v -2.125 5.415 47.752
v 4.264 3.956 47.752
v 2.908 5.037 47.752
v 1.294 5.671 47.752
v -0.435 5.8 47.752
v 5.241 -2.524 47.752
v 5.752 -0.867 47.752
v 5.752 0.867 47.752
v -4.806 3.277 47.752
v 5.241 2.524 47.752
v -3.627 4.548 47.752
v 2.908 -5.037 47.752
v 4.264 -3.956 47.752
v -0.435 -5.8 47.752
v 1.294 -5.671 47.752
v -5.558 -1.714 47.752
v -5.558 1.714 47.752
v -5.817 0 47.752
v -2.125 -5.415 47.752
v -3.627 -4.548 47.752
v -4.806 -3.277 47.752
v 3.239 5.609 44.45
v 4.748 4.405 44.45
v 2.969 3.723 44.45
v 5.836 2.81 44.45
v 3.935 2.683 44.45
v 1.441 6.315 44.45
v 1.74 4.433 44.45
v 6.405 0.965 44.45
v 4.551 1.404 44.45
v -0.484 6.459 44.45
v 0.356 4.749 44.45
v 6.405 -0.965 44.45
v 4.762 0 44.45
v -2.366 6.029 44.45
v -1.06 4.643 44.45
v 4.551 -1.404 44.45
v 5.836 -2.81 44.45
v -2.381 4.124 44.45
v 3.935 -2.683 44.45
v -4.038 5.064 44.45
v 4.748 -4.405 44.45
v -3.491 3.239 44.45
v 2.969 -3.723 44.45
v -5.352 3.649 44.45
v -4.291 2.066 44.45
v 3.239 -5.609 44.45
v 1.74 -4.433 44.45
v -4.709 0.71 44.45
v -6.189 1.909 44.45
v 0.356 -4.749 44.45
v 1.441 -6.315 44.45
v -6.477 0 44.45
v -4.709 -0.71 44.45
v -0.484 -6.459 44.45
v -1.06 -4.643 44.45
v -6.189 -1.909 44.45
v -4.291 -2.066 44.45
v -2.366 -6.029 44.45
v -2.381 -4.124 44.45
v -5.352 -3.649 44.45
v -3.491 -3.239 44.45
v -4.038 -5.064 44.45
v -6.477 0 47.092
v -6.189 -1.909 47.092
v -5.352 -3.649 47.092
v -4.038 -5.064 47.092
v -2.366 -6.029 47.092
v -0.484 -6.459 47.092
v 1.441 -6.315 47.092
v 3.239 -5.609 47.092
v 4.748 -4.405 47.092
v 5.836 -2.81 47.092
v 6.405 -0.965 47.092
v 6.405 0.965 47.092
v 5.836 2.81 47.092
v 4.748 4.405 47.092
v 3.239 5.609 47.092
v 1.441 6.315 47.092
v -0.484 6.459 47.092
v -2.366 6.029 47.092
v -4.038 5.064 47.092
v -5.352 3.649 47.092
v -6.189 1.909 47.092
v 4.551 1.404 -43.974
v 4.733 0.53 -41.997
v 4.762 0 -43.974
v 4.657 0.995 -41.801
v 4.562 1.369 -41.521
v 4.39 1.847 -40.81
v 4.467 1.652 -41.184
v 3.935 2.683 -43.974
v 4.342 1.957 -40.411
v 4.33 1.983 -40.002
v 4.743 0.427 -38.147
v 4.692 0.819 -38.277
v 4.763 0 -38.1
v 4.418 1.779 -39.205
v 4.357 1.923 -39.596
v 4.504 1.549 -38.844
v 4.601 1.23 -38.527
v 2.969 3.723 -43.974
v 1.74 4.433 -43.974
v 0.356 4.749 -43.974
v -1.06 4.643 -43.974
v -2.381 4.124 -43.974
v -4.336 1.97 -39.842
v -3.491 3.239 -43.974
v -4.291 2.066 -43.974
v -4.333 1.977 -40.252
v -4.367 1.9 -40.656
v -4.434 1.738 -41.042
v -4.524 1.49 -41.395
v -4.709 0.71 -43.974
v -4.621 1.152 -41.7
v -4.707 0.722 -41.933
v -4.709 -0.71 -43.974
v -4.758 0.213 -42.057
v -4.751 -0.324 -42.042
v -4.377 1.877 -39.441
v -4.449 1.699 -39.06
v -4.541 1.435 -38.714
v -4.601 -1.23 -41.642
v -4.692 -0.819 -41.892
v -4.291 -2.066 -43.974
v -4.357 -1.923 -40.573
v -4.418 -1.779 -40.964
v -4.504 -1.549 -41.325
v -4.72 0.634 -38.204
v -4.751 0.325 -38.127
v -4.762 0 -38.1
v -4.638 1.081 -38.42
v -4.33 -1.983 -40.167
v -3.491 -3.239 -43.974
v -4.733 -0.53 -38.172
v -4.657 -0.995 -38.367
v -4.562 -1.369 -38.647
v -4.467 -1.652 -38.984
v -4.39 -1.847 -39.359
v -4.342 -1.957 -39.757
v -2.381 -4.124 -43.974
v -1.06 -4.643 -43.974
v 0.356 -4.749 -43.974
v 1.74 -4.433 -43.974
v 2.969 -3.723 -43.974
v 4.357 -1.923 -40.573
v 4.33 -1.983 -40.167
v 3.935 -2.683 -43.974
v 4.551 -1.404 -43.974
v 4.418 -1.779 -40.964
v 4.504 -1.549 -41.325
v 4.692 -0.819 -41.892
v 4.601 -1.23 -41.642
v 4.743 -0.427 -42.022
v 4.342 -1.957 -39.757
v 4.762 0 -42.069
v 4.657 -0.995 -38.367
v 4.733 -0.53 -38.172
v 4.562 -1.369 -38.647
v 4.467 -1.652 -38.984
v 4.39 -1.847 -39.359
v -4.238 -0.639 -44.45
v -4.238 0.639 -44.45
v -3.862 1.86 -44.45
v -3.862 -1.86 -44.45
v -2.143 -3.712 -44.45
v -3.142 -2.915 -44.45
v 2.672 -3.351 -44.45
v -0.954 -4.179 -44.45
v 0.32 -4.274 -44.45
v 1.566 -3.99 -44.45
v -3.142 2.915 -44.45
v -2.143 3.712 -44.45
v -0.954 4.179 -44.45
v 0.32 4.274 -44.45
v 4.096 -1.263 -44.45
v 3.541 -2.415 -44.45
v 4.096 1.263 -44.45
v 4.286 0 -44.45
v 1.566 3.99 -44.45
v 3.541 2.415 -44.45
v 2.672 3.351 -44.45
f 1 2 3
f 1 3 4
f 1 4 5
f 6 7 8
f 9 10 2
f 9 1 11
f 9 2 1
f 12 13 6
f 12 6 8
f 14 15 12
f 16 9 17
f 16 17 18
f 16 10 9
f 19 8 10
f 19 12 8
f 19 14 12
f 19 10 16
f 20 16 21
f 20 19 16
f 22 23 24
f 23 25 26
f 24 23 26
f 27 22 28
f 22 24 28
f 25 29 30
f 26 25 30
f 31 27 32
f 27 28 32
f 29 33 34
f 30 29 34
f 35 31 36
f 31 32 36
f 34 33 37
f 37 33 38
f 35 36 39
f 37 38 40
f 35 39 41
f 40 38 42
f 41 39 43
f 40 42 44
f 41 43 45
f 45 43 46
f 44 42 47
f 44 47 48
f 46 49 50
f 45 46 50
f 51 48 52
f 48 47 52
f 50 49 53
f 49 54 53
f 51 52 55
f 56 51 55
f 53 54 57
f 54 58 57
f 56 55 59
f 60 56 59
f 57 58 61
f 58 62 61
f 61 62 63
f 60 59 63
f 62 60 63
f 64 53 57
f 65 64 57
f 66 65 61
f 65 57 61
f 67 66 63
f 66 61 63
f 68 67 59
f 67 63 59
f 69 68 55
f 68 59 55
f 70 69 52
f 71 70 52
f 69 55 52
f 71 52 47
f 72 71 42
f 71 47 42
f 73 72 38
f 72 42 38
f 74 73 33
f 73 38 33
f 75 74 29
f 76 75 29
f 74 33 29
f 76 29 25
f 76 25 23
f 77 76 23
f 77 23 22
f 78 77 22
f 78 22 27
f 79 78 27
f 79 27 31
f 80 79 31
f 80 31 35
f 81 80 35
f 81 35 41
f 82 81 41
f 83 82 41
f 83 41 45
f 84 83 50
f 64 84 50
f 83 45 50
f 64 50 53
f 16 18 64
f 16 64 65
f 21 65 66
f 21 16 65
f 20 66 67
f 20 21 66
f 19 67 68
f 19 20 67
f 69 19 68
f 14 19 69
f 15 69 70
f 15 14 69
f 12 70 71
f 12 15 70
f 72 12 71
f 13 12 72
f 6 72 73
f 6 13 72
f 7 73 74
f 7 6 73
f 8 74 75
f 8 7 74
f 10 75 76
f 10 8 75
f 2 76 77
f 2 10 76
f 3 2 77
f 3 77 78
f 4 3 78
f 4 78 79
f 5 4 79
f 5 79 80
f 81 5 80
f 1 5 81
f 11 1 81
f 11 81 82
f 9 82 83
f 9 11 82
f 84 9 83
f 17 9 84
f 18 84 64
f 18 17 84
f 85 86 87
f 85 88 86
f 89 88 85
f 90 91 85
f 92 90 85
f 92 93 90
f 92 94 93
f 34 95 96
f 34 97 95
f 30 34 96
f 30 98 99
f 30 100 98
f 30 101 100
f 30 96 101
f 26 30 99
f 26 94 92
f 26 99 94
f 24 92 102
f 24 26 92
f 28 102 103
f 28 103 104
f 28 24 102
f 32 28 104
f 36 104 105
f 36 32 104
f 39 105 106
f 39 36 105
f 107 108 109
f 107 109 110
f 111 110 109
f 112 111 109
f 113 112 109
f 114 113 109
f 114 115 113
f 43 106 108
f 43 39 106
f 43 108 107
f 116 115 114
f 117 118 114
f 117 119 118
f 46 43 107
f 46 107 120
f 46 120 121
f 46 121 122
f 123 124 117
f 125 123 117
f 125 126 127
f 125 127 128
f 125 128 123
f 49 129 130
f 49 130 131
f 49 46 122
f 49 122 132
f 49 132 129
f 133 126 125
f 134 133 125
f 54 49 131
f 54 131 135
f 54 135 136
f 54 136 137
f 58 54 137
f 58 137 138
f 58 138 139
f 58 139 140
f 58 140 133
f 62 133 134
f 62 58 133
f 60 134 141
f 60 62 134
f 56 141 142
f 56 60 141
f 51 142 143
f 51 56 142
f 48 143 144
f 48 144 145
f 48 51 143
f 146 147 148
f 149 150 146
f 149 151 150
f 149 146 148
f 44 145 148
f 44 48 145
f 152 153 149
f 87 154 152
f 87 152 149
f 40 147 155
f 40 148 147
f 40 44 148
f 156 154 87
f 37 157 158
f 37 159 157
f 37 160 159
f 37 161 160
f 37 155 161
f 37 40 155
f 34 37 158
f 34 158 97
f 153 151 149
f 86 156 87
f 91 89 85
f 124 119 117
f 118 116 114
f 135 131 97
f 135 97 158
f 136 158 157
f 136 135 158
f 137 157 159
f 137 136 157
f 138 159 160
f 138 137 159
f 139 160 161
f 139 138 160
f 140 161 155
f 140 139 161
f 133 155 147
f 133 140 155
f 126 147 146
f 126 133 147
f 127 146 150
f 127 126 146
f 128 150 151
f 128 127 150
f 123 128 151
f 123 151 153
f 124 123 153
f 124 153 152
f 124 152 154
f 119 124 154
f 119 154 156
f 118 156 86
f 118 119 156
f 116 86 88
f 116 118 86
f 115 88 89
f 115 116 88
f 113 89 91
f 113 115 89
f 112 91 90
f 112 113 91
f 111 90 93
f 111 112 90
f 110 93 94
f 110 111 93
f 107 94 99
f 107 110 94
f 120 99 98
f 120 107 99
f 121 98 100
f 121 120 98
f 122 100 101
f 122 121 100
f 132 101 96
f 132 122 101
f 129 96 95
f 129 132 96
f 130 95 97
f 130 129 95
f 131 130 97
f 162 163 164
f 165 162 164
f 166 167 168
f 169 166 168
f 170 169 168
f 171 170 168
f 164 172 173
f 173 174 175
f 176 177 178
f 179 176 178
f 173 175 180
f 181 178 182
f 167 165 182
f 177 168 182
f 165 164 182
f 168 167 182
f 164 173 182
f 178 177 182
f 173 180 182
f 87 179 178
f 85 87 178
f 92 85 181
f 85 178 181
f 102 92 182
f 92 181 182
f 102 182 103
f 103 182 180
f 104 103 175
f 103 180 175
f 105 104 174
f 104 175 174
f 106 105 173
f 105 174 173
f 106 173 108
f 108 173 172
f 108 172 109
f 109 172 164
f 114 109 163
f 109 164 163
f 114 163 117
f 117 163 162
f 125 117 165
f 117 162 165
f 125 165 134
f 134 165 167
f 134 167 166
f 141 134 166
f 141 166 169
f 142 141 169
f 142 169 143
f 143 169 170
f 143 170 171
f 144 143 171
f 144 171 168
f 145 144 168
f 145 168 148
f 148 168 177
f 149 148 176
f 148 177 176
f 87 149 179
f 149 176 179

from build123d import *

# Parameters (mm, degrees)
SKETCH1_R           = 4.7625
EXTRUDE1_DEPTH      = 44.45
SKETCH2_R           = 6.477
EXTRUDE2_DEPTH      = 3.302
CHAMFER1_SIZE       = 0.6604
EXTRUDE3_DEPTH      = 49.622593123
EXTRUDE3_DEPTH_BACK = 49.622593123
SKETCH3_R           = 1.984375
CHAMFER2_SIZE       = 0.47625


with BuildPart() as part:
    # Sketch1 → Extrude1 (new, symmetric)
    with BuildSketch(Plane.XY):
        Circle(SKETCH1_R)
    extrude(amount=EXTRUDE1_DEPTH, both=True)

    # Sketch2 → Extrude2 (add)
    with BuildSketch(Plane.XY.offset(44.45)):
        with Locations(Location((0, 0, 0), (0, 0, 180))):
            Circle(SKETCH2_R)
    extrude(amount=EXTRUDE2_DEPTH)

    # Chamfer1
    chamfer1_edges = [part.edges().sort_by_distance(p)[0] for p in [
        (6.477, 0, 47.752),
    ]]
    chamfer(chamfer1_edges, length=CHAMFER1_SIZE)

    # Sketch3 → Extrude3 (cut, two sides: drawn at the far end of the back side and taken through both)
    with BuildSketch(Plane(origin=(0, 0, 0), x_dir=(0, 0, -1), z_dir=(1, 0, 0)).offset(-EXTRUDE3_DEPTH_BACK)):
        with Locations(Location((40.084375, 0, 0), (0, 0, 180.000000002))):
            Circle(SKETCH3_R)
    extrude(amount=EXTRUDE3_DEPTH + EXTRUDE3_DEPTH_BACK, mode=Mode.SUBTRACT)

    # Chamfer2
    chamfer2_edges = [part.edges().sort_by_distance(p)[0] for p in [
        (-4.7625, 0, -44.45),
    ]]
    chamfer(chamfer2_edges, length=CHAMFER2_SIZE)


solid = part.part
